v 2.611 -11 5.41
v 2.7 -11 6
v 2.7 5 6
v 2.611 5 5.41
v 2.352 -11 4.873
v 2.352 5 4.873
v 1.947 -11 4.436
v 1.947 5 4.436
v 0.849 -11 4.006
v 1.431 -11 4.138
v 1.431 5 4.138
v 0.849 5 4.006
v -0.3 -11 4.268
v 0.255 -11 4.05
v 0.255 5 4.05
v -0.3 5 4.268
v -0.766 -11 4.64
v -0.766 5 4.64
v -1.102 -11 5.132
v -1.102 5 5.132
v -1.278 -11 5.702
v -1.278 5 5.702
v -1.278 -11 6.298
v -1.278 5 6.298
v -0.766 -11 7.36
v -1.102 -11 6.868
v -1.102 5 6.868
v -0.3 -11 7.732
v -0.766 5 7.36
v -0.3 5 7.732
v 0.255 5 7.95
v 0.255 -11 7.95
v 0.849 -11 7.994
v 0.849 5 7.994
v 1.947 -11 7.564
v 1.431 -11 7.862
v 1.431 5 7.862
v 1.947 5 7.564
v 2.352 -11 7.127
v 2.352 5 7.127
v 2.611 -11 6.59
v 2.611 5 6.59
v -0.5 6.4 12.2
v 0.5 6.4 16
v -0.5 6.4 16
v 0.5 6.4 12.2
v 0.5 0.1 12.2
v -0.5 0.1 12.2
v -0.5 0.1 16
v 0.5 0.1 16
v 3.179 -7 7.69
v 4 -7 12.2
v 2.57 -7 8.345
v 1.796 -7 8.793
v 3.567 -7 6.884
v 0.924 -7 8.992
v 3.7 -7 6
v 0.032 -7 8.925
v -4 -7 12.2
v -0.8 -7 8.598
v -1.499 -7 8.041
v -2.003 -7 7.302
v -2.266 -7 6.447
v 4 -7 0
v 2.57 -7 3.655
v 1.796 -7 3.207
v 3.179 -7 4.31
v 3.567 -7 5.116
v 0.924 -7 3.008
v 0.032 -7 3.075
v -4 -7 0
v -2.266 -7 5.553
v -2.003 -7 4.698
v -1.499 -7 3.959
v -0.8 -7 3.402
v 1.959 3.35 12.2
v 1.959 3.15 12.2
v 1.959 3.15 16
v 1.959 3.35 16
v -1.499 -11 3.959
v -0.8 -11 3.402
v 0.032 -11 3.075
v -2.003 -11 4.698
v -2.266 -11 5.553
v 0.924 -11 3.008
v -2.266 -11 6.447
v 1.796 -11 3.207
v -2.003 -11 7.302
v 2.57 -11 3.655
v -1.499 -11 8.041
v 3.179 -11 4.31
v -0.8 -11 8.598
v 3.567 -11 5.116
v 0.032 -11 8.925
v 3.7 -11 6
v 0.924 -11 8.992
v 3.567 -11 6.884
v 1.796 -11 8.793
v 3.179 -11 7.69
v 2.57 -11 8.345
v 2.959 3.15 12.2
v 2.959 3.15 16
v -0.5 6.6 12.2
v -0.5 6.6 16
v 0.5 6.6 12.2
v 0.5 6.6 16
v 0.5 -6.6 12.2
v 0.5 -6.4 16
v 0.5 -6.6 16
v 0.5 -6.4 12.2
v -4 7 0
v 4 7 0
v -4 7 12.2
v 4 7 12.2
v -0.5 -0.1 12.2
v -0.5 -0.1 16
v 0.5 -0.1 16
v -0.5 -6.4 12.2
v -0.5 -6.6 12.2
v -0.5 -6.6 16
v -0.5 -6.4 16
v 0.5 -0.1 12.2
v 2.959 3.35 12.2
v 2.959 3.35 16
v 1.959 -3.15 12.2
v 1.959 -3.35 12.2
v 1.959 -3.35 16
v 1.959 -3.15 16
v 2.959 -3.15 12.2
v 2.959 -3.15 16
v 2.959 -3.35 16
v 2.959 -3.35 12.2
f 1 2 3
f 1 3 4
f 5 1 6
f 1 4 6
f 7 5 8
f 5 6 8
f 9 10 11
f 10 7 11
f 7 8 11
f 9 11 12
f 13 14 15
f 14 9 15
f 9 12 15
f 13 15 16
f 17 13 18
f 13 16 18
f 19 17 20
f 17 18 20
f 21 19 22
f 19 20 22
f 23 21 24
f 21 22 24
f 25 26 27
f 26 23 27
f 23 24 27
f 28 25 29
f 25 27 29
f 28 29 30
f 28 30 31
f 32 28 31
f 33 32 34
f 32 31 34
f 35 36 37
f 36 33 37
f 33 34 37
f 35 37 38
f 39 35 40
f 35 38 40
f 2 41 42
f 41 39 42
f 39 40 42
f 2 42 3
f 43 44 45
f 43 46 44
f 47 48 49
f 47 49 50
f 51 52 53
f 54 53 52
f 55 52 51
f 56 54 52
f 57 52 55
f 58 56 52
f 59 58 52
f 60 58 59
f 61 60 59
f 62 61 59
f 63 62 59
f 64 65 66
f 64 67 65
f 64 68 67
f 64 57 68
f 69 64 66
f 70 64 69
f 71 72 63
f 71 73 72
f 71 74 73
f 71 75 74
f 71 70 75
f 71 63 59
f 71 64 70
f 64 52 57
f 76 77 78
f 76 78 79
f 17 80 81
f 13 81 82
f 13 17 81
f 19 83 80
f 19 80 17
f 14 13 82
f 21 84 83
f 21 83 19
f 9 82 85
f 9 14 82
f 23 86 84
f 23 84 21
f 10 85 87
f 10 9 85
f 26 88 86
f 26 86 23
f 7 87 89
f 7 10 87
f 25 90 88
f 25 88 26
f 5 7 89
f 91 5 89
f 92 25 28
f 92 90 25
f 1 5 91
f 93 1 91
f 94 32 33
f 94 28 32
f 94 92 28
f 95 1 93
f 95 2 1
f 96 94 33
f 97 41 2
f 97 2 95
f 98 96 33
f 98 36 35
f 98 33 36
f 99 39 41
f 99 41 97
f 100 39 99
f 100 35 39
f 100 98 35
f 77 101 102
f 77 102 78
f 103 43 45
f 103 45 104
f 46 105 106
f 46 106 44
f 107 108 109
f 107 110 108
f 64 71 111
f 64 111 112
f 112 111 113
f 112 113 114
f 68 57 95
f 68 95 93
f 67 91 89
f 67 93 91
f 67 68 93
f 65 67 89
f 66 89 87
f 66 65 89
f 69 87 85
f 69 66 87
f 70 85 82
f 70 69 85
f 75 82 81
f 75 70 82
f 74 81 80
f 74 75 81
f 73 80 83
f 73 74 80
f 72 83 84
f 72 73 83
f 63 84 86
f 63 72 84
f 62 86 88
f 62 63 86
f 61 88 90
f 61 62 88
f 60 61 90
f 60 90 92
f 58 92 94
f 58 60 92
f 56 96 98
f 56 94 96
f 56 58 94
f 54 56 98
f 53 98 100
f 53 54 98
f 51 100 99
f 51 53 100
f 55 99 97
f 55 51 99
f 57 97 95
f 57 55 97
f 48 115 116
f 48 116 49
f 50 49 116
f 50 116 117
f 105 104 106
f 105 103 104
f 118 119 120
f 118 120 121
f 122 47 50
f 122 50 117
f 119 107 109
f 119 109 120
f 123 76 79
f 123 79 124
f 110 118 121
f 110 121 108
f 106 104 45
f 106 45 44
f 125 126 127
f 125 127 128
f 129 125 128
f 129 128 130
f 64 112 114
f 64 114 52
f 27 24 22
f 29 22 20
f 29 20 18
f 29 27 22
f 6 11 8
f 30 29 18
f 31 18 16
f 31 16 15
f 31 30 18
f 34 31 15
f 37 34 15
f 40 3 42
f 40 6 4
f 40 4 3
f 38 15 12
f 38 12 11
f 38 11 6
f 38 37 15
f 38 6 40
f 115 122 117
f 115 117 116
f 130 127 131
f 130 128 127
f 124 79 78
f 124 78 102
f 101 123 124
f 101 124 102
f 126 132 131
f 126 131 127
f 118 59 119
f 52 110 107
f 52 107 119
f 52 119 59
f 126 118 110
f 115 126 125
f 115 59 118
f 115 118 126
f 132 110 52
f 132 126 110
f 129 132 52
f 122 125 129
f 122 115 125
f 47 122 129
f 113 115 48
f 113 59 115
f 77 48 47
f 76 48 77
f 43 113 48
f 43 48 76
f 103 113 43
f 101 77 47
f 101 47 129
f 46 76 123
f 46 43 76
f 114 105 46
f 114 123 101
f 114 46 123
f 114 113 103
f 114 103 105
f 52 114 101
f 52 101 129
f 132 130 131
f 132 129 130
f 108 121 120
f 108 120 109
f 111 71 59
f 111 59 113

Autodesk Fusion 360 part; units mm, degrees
sketch "Sketch1" plane through (0, 0, 0) normal (0, 0, 1) x (1, 0, 0)
  line L0 (4, -7) -> (-4, -7)
  line L1 (-4, -7) -> (-4, 7)
  line L2 (-4, 7) -> (4, 7)
  line L3 (4, 7) -> (4, -7)
  line L4 (4, -7) -> (-4, 7) construction
  line L5 (-4, -7) -> (4, 7) construction
  line L6 (0.5, -0.1) -> (-0.5, -0.1)
  line L7 (-0.5, -0.1) -> (-0.5, 0.1)
  line L8 (-0.5, 0.1) -> (0.5, 0.1)
  line L9 (0.5, 0.1) -> (0.5, -0.1)
  line L10 (0.5, -0.1) -> (-0.5, 0.1) construction
  line L11 (-0.5, -0.1) -> (0.5, 0.1) construction
  line L12 (0.5, -6.6) -> (-0.5, -6.6)
  line L13 (-0.5, -6.6) -> (-0.5, -6.4)
  line L14 (0.5, -6.4) -> (0.5, -6.6)
  line L15 (-0.5, -6.4) -> (0.5, -6.4)
  line L16 (2.959, -3.35) -> (1.959, -3.35)
  line L17 (1.959, -3.35) -> (1.959, -3.15)
  line L18 (2.959, -3.15) -> (2.959, -3.35)
  line L19 (1.959, -3.15) -> (2.959, -3.15)
  line L20 (2.959, 3.15) -> (1.959, 3.15)
  line L21 (1.959, 3.15) -> (1.959, 3.35)
  line L22 (2.959, 3.35) -> (2.959, 3.15)
  line L23 (1.959, 3.35) -> (2.959, 3.35)
  line L24 (0.5, 6.4) -> (-0.5, 6.4)
  line L25 (-0.5, 6.4) -> (-0.5, 6.6)
  line L26 (0.5, 6.6) -> (0.5, 6.4)
  line L27 (-0.5, 6.6) -> (0.5, 6.6)
  dimension "d61" = 8
  dimension "d62" = 14
  dimension "d63" = 1
  dimension "d64" = 0.2
  dimension "d67" = 2.459
  dimension "d68" = 6.5
extrude "Extrude1" add sketch "Sketch1" along normal blind 16 contours L6 L7 L8 L9 | L12 L13 L14 L15 | L16 L17 L18 L19 | L20 L21 L22 L23 | L24 L25 L26 L27 makes body 1 at (0.1667, -0.1, 5.3333) makes body 2 at (2.6257, 3.15, 5.3333) makes body 3 at (2.6257, -3.35, 5.3333) makes body 4 at (0.1667, 6.4, 5.3333) makes body 5 at (0.1667, -6.6, 5.3333)
extrude "Extrude2" add sketch "Sketch1" along normal blind 12.2 bodies 1 2 3 4 5
sketch "Sketch2" plane through (0, -7, 0) normal (0, -1, 0) x (1, 0, 0)
  line L0 (-4, 0) -> (4, 0)
  line L1 (4, 0) -> (4, 12.2)
  line L2 (4, 12.2) -> (-4, 12.2)
  line L3 (-4, 12.2) -> (-4, 0)
  circle A0 centre (0.7, 6) radius 3
  circle A1 centre (0.7, 6) radius 2
  line L4 (4, 0) -> (-4, 0)
  dimension "d73" = 6
  dimension "d74" = -1
  dimension "d76" = 3.3
  dimension "d78" = 6
extrude "Extrude3" add sketch "Sketch2" along normal blind 4 contours A0 bodies 1
extrude "Extrude4" cut sketch "Sketch2" against normal blind 12 contours A1 bodies 1
